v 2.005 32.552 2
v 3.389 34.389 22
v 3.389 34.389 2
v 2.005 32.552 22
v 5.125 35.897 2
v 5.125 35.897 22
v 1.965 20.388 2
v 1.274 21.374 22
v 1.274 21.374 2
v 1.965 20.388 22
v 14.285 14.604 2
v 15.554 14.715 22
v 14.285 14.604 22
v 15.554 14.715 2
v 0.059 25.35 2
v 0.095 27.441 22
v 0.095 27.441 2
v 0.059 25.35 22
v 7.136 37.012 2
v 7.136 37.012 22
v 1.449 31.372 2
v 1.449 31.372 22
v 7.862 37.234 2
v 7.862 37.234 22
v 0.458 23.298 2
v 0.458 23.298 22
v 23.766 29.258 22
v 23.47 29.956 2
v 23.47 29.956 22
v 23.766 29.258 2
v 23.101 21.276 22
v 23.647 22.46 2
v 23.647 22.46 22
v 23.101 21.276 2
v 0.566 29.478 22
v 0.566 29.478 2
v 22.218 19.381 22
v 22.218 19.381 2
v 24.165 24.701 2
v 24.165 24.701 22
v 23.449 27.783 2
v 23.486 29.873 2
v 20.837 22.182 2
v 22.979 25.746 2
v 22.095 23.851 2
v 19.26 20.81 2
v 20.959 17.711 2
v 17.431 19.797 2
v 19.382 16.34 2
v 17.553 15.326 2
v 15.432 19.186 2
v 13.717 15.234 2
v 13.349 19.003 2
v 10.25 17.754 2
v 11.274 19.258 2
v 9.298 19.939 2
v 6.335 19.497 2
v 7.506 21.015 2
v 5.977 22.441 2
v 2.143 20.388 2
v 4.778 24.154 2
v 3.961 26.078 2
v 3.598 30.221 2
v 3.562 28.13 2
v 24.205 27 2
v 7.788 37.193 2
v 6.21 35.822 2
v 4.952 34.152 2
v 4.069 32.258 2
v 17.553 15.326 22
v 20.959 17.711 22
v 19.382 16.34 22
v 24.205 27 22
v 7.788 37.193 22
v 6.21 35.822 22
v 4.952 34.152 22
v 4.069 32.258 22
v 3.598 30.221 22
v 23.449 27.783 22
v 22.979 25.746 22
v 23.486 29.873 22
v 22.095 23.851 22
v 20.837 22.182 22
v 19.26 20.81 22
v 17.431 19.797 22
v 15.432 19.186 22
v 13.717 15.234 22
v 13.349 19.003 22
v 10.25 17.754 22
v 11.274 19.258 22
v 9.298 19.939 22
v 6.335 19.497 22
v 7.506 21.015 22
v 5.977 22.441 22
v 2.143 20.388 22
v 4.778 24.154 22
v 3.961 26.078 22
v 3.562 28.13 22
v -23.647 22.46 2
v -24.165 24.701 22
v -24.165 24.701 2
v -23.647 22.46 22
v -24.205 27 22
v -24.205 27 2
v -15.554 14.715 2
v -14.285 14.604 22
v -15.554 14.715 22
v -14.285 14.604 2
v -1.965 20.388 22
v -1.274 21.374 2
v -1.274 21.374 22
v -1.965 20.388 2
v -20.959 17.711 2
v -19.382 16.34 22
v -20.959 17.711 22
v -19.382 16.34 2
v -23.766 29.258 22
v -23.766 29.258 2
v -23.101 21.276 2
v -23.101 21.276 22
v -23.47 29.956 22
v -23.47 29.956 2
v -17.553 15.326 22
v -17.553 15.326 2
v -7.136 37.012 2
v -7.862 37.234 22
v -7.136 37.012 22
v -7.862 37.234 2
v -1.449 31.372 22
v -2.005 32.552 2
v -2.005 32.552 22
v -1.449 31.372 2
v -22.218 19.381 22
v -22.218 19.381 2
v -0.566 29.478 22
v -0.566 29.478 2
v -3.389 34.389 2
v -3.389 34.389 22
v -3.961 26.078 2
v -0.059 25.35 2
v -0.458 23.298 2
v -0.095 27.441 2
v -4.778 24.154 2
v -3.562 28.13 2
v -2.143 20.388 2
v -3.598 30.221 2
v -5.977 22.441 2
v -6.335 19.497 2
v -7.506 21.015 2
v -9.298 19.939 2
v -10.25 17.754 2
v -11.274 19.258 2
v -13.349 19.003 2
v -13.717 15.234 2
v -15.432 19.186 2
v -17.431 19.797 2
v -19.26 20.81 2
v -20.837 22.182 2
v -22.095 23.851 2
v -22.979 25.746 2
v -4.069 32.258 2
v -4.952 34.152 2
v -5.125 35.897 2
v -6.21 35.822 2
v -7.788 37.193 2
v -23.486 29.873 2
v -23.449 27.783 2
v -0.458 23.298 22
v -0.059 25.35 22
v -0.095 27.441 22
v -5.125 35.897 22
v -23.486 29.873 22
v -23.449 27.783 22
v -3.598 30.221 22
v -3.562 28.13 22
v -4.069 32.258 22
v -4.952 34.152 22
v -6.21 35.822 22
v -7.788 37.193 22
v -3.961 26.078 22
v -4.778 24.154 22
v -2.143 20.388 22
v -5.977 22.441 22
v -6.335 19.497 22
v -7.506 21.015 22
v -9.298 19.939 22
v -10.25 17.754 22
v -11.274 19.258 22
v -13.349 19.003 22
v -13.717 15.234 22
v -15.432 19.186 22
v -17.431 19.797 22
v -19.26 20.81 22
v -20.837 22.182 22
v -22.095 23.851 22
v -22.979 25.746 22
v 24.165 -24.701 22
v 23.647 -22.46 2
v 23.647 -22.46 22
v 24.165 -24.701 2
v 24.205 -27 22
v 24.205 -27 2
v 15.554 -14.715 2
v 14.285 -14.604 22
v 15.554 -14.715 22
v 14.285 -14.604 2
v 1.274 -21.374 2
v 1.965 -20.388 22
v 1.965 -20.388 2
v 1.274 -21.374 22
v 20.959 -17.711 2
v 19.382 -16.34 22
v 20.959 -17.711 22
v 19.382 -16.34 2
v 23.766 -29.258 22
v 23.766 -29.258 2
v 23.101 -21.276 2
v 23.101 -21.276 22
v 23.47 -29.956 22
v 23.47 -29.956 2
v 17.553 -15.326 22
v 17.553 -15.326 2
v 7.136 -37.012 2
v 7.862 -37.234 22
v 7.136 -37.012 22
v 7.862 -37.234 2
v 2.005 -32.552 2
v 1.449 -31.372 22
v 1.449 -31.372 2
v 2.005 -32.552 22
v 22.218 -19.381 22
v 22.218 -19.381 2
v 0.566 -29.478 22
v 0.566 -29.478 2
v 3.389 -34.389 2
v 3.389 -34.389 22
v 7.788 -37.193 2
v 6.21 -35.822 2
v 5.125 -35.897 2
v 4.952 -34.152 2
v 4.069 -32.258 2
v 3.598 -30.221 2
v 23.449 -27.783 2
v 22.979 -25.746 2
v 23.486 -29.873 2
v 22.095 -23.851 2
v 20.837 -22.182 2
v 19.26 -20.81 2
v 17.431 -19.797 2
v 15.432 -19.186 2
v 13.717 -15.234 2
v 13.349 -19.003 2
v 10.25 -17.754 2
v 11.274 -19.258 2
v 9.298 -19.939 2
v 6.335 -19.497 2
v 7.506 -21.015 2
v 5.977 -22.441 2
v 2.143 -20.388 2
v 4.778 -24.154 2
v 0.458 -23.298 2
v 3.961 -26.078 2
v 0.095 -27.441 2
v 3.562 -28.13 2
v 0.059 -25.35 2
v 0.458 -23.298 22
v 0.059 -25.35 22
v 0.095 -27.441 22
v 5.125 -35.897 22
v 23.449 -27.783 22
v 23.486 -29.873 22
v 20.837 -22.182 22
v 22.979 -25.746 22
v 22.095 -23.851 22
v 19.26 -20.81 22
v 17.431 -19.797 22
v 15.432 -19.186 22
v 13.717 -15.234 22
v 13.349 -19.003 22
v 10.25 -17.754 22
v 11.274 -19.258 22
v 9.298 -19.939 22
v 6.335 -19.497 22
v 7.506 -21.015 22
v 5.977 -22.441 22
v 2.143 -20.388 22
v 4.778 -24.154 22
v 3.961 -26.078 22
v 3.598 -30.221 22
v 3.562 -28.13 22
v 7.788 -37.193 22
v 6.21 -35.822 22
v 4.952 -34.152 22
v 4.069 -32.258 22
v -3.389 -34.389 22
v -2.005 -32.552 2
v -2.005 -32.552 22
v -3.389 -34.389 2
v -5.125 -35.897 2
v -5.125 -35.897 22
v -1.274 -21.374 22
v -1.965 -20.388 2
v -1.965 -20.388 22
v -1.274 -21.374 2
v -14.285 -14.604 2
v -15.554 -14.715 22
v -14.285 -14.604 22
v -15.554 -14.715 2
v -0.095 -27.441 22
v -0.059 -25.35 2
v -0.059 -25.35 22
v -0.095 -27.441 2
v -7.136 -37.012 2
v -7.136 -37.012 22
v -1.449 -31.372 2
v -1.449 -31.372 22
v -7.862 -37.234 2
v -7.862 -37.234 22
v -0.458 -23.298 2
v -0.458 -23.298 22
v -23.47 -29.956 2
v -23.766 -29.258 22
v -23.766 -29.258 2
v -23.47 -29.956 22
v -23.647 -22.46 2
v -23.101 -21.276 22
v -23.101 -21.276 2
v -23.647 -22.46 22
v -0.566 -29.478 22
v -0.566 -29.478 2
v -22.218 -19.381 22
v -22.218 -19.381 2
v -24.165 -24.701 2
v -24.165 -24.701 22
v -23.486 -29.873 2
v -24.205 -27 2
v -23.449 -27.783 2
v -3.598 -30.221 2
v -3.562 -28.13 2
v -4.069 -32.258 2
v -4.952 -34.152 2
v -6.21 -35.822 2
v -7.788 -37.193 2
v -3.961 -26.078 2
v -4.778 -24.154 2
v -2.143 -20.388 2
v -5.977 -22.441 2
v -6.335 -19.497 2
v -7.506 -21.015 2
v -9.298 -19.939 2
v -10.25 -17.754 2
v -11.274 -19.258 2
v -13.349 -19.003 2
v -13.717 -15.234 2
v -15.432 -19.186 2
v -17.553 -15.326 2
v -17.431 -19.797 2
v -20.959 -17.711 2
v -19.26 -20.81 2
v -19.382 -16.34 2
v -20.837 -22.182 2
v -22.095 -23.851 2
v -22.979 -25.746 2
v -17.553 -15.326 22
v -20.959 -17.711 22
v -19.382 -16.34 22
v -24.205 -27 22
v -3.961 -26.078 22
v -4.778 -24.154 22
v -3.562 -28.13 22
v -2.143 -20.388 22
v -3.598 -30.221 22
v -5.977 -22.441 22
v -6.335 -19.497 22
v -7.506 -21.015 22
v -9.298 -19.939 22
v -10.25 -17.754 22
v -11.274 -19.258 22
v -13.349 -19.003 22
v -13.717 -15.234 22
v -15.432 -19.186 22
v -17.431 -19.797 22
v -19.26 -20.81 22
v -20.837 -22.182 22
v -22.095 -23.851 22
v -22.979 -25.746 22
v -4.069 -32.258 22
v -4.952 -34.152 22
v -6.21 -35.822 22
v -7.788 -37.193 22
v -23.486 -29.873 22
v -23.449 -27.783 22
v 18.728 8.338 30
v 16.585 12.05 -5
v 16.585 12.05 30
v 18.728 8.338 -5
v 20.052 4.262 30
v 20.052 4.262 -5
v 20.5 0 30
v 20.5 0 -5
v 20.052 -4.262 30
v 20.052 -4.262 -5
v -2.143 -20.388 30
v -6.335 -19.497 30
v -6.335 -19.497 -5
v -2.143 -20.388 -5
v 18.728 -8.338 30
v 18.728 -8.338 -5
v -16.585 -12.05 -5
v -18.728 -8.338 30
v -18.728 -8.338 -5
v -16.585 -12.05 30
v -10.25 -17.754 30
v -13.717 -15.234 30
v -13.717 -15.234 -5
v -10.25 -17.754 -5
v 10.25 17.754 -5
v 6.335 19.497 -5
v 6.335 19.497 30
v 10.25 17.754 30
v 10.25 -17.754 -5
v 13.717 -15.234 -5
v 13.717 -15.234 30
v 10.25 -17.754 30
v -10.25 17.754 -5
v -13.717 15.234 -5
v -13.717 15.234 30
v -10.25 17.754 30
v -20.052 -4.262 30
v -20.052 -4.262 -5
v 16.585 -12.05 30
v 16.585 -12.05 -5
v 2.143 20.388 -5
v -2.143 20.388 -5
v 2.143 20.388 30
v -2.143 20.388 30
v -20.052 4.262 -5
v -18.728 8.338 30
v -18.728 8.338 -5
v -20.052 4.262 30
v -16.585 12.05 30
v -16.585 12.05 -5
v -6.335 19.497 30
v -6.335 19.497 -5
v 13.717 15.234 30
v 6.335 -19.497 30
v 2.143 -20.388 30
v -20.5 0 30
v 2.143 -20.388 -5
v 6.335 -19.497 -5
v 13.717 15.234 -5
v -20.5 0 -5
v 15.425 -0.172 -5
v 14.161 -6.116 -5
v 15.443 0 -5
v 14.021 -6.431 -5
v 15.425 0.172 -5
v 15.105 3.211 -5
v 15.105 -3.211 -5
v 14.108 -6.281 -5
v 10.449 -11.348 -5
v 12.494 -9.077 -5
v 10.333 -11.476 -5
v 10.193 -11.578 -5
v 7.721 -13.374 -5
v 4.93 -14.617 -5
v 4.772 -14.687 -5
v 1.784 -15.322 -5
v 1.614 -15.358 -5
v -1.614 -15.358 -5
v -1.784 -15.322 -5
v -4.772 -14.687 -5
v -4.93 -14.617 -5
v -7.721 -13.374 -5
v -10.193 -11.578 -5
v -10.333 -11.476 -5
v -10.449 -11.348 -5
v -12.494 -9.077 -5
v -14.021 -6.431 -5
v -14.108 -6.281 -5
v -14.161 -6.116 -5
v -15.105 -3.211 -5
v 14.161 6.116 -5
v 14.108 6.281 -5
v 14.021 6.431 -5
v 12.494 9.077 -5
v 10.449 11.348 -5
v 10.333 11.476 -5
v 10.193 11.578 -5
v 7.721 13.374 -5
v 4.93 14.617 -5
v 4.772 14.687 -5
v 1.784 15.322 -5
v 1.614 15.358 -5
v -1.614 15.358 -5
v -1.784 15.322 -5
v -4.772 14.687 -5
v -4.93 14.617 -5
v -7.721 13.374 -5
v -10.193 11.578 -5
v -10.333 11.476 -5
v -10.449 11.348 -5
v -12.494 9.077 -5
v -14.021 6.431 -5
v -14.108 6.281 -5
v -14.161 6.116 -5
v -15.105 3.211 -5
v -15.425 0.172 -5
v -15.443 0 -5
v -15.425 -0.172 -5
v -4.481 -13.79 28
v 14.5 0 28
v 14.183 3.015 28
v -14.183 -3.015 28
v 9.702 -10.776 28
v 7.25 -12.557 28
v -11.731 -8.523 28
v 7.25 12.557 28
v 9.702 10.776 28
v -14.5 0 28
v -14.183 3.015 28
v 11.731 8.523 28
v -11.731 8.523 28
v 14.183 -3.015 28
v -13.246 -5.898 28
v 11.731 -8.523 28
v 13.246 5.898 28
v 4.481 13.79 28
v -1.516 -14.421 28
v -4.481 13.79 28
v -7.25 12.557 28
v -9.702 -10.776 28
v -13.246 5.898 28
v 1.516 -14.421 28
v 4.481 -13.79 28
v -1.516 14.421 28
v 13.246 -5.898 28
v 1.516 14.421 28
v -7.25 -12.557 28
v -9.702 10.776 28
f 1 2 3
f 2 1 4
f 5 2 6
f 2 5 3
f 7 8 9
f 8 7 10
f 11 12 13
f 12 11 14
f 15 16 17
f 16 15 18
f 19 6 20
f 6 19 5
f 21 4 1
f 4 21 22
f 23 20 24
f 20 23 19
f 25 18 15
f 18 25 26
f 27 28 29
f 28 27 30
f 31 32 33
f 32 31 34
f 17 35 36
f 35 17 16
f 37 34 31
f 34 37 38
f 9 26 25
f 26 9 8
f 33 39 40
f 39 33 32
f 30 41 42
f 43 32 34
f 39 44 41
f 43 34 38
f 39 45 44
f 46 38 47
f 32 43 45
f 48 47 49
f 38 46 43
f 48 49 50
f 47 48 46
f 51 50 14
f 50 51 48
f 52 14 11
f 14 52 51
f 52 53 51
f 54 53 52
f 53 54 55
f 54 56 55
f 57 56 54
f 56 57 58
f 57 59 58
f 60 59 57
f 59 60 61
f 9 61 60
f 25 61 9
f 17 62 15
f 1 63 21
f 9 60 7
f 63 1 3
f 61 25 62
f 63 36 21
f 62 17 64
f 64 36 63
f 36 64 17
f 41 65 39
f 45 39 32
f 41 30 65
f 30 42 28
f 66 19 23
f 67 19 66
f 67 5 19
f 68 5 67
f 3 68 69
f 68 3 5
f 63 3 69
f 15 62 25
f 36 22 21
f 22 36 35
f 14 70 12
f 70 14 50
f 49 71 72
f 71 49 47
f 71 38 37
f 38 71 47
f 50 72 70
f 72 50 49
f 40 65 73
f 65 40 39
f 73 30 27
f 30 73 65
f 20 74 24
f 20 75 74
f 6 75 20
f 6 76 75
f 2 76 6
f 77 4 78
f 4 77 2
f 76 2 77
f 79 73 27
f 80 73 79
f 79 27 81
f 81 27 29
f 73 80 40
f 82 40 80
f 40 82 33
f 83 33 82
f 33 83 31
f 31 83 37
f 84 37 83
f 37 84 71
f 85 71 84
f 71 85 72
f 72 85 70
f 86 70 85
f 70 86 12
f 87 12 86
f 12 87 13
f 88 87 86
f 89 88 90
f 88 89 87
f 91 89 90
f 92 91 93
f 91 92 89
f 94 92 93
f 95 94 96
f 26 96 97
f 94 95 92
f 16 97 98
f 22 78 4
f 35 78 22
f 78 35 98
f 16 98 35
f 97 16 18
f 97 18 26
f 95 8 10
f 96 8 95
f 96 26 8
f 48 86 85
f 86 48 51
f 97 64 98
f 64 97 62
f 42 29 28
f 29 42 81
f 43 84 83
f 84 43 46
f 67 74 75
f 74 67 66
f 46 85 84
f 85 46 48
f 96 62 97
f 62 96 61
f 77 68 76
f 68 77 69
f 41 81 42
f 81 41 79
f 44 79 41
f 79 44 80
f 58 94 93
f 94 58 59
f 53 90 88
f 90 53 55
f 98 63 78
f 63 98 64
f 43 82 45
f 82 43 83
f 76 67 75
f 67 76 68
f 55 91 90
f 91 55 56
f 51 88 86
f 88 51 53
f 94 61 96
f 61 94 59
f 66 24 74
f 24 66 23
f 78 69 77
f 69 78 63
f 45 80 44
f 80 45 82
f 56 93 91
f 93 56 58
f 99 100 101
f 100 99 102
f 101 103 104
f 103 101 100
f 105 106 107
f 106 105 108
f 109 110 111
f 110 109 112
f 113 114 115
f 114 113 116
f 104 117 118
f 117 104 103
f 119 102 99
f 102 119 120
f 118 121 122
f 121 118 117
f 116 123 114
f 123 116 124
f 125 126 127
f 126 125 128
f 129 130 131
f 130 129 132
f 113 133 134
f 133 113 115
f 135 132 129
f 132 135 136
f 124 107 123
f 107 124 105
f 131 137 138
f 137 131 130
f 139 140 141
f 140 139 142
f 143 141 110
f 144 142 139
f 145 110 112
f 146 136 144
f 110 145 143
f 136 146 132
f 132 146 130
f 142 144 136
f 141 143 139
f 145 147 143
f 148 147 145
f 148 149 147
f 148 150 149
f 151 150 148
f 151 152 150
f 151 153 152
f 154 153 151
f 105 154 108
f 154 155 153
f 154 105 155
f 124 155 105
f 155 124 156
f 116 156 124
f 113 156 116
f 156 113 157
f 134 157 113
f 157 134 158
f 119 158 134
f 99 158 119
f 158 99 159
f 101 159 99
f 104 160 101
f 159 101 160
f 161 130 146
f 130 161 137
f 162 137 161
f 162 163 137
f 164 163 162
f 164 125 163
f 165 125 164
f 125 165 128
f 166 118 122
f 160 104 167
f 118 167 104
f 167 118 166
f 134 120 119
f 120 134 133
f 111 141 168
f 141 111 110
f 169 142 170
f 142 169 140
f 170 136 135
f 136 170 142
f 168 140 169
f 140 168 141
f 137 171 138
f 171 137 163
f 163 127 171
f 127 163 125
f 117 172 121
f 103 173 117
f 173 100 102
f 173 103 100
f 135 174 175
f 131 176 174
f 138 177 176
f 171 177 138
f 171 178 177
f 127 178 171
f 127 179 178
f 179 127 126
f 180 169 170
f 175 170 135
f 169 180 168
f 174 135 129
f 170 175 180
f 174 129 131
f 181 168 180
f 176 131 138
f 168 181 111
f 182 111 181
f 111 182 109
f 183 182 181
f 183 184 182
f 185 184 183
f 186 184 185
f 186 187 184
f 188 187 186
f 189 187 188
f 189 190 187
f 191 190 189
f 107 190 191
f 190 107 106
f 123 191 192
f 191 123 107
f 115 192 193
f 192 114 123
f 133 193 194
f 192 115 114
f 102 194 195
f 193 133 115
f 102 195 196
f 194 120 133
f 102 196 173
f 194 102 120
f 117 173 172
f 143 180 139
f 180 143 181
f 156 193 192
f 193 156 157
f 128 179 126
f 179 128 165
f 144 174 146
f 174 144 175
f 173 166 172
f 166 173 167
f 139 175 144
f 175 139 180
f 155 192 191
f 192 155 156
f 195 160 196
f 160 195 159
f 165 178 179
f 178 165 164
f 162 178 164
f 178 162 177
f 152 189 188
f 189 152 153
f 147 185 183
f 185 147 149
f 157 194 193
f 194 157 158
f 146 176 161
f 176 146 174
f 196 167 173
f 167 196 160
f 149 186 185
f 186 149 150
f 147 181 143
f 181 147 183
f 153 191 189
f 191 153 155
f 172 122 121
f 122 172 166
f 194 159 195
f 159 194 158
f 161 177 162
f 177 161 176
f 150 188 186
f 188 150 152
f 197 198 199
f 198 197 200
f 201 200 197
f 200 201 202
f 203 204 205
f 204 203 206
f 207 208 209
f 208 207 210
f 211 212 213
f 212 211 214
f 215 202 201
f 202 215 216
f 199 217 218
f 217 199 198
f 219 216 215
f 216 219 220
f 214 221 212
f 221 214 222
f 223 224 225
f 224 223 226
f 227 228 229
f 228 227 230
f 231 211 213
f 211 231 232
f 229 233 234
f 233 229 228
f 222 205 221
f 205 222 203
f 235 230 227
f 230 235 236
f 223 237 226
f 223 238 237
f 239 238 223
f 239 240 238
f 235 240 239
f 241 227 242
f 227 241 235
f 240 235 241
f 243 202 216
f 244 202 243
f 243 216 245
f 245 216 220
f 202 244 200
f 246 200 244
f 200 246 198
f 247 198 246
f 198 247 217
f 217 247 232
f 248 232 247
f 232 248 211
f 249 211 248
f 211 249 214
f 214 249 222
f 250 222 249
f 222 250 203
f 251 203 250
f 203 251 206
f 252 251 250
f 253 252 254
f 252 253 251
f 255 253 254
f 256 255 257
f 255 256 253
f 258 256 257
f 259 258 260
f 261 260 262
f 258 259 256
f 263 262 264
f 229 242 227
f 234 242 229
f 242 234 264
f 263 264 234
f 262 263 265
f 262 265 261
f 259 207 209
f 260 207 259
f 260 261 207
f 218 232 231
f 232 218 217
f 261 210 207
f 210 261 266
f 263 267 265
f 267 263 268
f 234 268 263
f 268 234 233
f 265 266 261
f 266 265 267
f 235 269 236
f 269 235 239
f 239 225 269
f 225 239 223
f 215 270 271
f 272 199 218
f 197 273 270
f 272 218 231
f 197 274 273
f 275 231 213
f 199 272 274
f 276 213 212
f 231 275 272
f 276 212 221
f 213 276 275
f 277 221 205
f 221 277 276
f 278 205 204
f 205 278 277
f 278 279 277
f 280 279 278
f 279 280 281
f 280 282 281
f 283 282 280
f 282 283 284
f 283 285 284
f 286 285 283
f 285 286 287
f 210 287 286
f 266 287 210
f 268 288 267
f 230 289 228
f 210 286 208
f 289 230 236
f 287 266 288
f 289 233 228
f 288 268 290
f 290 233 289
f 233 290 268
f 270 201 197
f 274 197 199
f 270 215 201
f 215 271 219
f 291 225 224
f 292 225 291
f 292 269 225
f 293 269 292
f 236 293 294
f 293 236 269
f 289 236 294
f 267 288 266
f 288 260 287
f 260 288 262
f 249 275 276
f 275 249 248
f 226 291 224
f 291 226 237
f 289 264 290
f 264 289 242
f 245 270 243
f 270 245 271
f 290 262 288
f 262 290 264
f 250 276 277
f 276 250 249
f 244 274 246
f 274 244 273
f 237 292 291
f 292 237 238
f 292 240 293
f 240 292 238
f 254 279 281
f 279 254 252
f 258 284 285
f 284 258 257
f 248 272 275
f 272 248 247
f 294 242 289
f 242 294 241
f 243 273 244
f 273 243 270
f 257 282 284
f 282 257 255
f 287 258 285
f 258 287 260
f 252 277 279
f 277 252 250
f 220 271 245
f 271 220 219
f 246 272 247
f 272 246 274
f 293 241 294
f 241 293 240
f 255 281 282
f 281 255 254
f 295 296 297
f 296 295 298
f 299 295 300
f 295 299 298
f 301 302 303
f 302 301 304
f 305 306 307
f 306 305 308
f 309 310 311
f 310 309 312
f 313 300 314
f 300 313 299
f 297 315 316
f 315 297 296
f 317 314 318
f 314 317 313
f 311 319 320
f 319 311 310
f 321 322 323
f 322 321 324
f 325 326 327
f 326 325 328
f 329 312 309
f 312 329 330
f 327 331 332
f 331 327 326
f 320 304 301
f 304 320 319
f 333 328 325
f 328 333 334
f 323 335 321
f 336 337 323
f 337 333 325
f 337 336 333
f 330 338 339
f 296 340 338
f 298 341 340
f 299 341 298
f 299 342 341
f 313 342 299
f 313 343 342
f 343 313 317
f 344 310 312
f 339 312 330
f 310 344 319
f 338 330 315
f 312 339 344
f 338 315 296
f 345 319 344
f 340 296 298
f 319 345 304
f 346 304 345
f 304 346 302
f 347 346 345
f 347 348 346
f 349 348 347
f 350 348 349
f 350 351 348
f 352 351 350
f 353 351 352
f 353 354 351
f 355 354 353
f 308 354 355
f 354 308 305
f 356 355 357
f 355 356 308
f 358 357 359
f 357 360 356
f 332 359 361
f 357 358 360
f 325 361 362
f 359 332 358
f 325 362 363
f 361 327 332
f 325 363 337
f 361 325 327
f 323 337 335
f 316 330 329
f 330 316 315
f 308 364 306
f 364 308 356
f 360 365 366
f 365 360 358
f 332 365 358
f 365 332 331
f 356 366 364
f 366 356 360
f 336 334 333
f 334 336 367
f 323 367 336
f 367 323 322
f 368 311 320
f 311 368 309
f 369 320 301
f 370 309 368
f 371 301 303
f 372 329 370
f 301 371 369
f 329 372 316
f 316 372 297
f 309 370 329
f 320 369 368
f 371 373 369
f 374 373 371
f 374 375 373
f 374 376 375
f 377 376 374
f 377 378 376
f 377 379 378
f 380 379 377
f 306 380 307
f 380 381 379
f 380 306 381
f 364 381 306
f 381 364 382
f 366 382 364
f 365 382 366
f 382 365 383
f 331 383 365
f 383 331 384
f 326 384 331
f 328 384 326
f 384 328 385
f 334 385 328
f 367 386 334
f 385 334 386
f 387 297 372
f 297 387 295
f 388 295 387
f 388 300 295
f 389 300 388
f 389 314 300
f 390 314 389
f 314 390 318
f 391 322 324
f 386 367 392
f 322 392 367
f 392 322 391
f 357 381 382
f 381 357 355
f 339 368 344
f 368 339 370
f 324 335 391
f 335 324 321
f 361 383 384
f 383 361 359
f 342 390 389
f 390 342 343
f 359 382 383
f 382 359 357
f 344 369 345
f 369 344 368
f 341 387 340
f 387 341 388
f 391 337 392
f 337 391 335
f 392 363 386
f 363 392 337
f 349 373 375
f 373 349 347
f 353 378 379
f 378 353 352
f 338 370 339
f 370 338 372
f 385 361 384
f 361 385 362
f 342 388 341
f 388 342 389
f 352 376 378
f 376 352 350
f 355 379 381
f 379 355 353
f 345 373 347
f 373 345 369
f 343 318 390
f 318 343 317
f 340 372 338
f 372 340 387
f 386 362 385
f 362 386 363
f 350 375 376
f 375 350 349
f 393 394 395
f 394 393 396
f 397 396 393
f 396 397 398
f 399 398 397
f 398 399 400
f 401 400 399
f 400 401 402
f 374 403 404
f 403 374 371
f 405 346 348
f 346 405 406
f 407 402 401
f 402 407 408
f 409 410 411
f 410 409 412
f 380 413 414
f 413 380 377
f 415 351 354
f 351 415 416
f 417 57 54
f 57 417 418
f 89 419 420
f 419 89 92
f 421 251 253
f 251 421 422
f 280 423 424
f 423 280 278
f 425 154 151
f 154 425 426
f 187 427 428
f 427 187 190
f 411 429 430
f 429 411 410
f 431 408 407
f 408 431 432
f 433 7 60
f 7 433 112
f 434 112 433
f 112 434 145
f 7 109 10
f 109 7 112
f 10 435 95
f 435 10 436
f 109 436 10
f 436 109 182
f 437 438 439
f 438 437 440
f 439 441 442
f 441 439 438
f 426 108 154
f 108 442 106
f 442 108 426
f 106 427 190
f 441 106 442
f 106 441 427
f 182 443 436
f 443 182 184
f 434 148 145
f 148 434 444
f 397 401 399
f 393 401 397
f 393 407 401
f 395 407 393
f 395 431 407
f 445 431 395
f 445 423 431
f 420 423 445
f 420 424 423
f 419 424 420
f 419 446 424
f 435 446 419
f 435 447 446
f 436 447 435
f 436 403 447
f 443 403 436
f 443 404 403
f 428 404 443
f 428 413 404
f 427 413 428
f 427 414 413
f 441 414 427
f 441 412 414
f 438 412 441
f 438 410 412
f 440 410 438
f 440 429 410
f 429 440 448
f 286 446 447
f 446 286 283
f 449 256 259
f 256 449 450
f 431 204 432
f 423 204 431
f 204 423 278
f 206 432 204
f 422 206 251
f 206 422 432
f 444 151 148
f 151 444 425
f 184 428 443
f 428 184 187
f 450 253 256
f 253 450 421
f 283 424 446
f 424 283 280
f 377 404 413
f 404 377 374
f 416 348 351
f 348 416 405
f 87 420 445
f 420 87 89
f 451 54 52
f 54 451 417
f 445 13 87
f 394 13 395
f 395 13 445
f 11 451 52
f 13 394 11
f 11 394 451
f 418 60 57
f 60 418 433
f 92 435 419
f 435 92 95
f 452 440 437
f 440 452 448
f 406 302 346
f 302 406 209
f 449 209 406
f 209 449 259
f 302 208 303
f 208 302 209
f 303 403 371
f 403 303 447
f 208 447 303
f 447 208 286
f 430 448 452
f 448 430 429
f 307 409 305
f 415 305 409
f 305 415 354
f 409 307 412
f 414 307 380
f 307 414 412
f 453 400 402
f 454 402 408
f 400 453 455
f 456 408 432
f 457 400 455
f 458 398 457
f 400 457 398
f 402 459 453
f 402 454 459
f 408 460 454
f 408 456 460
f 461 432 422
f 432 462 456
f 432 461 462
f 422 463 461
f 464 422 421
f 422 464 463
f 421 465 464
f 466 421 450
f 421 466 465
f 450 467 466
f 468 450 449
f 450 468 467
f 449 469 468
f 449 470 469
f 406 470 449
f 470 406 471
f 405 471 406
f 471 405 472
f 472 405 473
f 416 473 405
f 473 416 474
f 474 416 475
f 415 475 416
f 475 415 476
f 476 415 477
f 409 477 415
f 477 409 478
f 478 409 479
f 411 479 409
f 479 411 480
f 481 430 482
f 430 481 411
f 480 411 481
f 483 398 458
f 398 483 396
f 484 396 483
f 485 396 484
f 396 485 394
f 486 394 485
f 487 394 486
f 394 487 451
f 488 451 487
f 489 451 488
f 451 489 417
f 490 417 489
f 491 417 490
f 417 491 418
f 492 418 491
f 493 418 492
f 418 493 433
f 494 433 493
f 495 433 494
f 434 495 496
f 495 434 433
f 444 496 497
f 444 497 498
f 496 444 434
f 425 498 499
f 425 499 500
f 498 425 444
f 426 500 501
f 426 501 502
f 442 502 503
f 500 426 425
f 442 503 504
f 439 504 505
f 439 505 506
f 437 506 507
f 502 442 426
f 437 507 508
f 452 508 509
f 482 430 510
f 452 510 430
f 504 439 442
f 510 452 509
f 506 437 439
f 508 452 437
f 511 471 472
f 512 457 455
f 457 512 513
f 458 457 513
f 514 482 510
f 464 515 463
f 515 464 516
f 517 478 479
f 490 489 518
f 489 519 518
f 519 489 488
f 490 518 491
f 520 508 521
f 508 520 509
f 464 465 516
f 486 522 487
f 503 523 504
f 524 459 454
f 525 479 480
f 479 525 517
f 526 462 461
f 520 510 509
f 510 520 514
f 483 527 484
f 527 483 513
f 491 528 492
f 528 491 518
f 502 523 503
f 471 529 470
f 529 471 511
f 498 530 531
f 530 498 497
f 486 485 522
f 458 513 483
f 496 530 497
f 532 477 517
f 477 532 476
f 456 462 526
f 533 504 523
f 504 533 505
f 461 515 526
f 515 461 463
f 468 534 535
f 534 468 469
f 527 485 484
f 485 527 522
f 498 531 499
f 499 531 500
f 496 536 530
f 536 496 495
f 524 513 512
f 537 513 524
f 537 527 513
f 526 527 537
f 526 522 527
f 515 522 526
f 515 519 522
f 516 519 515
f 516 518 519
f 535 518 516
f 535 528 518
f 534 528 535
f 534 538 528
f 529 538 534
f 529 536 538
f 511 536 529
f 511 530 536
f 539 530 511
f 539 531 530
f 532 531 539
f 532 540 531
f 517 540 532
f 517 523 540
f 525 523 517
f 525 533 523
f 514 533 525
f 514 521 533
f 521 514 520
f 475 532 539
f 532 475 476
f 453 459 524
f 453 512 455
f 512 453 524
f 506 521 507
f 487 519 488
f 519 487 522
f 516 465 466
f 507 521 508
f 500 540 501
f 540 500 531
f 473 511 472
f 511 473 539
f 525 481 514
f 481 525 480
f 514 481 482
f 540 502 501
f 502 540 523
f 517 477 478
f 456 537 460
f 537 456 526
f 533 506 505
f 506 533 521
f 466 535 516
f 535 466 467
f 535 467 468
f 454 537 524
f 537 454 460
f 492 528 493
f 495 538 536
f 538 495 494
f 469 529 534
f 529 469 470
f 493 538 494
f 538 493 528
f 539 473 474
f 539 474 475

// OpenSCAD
module snap( d, x, height, taper=0 )
{
	difference() {
		linear_extrude( height, convexity=4 ) {
			hull() {
				translate( [0,-x,0] ) circle( d=d );
				translate( [0, x,0] ) circle( d=d );
				translate( [1.2, 1,0] ) circle( d=d+x );
				translate( [1.2, -1,0] ) circle( d=d+x );
			}
		}
		translate( [2*x,0,-1] ) cylinder( d1=d, d2=d+taper, h=height+2 );
	}
}

module shots()
{
	bottle = 31;
	glass = 35;
	flavour = 20;
	thickness = 2;

	away =  34;
	away2 = 28;
	height1 = 35;
	height2 = 30;
	height3 = 20;

	translate( [0,0,2] ) {
		rotate( [0,0,65] ) translate( [away2,0,0] ) snap(flavour,2, height3);
		rotate( [0,0,115] ) translate( [away2,0,0] ) snap(flavour,2, height3);
		rotate( [0,0,-65] ) translate( [away2,0,0] ) snap(flavour,2, height3);
		rotate( [0,0,-115] ) translate( [away2,0,0] ) snap(flavour,2, height3);
	}

	translate( [0,0,-5] ) difference() {
		cylinder( d=bottle + 10, h=height1 );
		translate( [0,0,-thickness] ) cylinder( d1=bottle, d2=bottle-2, h=height1 );
		//translate( [0,0,height1-1] ) cylinder( d=bottle-1,h=10 );
	}
}
//snap(20,2,20);
 shots();
